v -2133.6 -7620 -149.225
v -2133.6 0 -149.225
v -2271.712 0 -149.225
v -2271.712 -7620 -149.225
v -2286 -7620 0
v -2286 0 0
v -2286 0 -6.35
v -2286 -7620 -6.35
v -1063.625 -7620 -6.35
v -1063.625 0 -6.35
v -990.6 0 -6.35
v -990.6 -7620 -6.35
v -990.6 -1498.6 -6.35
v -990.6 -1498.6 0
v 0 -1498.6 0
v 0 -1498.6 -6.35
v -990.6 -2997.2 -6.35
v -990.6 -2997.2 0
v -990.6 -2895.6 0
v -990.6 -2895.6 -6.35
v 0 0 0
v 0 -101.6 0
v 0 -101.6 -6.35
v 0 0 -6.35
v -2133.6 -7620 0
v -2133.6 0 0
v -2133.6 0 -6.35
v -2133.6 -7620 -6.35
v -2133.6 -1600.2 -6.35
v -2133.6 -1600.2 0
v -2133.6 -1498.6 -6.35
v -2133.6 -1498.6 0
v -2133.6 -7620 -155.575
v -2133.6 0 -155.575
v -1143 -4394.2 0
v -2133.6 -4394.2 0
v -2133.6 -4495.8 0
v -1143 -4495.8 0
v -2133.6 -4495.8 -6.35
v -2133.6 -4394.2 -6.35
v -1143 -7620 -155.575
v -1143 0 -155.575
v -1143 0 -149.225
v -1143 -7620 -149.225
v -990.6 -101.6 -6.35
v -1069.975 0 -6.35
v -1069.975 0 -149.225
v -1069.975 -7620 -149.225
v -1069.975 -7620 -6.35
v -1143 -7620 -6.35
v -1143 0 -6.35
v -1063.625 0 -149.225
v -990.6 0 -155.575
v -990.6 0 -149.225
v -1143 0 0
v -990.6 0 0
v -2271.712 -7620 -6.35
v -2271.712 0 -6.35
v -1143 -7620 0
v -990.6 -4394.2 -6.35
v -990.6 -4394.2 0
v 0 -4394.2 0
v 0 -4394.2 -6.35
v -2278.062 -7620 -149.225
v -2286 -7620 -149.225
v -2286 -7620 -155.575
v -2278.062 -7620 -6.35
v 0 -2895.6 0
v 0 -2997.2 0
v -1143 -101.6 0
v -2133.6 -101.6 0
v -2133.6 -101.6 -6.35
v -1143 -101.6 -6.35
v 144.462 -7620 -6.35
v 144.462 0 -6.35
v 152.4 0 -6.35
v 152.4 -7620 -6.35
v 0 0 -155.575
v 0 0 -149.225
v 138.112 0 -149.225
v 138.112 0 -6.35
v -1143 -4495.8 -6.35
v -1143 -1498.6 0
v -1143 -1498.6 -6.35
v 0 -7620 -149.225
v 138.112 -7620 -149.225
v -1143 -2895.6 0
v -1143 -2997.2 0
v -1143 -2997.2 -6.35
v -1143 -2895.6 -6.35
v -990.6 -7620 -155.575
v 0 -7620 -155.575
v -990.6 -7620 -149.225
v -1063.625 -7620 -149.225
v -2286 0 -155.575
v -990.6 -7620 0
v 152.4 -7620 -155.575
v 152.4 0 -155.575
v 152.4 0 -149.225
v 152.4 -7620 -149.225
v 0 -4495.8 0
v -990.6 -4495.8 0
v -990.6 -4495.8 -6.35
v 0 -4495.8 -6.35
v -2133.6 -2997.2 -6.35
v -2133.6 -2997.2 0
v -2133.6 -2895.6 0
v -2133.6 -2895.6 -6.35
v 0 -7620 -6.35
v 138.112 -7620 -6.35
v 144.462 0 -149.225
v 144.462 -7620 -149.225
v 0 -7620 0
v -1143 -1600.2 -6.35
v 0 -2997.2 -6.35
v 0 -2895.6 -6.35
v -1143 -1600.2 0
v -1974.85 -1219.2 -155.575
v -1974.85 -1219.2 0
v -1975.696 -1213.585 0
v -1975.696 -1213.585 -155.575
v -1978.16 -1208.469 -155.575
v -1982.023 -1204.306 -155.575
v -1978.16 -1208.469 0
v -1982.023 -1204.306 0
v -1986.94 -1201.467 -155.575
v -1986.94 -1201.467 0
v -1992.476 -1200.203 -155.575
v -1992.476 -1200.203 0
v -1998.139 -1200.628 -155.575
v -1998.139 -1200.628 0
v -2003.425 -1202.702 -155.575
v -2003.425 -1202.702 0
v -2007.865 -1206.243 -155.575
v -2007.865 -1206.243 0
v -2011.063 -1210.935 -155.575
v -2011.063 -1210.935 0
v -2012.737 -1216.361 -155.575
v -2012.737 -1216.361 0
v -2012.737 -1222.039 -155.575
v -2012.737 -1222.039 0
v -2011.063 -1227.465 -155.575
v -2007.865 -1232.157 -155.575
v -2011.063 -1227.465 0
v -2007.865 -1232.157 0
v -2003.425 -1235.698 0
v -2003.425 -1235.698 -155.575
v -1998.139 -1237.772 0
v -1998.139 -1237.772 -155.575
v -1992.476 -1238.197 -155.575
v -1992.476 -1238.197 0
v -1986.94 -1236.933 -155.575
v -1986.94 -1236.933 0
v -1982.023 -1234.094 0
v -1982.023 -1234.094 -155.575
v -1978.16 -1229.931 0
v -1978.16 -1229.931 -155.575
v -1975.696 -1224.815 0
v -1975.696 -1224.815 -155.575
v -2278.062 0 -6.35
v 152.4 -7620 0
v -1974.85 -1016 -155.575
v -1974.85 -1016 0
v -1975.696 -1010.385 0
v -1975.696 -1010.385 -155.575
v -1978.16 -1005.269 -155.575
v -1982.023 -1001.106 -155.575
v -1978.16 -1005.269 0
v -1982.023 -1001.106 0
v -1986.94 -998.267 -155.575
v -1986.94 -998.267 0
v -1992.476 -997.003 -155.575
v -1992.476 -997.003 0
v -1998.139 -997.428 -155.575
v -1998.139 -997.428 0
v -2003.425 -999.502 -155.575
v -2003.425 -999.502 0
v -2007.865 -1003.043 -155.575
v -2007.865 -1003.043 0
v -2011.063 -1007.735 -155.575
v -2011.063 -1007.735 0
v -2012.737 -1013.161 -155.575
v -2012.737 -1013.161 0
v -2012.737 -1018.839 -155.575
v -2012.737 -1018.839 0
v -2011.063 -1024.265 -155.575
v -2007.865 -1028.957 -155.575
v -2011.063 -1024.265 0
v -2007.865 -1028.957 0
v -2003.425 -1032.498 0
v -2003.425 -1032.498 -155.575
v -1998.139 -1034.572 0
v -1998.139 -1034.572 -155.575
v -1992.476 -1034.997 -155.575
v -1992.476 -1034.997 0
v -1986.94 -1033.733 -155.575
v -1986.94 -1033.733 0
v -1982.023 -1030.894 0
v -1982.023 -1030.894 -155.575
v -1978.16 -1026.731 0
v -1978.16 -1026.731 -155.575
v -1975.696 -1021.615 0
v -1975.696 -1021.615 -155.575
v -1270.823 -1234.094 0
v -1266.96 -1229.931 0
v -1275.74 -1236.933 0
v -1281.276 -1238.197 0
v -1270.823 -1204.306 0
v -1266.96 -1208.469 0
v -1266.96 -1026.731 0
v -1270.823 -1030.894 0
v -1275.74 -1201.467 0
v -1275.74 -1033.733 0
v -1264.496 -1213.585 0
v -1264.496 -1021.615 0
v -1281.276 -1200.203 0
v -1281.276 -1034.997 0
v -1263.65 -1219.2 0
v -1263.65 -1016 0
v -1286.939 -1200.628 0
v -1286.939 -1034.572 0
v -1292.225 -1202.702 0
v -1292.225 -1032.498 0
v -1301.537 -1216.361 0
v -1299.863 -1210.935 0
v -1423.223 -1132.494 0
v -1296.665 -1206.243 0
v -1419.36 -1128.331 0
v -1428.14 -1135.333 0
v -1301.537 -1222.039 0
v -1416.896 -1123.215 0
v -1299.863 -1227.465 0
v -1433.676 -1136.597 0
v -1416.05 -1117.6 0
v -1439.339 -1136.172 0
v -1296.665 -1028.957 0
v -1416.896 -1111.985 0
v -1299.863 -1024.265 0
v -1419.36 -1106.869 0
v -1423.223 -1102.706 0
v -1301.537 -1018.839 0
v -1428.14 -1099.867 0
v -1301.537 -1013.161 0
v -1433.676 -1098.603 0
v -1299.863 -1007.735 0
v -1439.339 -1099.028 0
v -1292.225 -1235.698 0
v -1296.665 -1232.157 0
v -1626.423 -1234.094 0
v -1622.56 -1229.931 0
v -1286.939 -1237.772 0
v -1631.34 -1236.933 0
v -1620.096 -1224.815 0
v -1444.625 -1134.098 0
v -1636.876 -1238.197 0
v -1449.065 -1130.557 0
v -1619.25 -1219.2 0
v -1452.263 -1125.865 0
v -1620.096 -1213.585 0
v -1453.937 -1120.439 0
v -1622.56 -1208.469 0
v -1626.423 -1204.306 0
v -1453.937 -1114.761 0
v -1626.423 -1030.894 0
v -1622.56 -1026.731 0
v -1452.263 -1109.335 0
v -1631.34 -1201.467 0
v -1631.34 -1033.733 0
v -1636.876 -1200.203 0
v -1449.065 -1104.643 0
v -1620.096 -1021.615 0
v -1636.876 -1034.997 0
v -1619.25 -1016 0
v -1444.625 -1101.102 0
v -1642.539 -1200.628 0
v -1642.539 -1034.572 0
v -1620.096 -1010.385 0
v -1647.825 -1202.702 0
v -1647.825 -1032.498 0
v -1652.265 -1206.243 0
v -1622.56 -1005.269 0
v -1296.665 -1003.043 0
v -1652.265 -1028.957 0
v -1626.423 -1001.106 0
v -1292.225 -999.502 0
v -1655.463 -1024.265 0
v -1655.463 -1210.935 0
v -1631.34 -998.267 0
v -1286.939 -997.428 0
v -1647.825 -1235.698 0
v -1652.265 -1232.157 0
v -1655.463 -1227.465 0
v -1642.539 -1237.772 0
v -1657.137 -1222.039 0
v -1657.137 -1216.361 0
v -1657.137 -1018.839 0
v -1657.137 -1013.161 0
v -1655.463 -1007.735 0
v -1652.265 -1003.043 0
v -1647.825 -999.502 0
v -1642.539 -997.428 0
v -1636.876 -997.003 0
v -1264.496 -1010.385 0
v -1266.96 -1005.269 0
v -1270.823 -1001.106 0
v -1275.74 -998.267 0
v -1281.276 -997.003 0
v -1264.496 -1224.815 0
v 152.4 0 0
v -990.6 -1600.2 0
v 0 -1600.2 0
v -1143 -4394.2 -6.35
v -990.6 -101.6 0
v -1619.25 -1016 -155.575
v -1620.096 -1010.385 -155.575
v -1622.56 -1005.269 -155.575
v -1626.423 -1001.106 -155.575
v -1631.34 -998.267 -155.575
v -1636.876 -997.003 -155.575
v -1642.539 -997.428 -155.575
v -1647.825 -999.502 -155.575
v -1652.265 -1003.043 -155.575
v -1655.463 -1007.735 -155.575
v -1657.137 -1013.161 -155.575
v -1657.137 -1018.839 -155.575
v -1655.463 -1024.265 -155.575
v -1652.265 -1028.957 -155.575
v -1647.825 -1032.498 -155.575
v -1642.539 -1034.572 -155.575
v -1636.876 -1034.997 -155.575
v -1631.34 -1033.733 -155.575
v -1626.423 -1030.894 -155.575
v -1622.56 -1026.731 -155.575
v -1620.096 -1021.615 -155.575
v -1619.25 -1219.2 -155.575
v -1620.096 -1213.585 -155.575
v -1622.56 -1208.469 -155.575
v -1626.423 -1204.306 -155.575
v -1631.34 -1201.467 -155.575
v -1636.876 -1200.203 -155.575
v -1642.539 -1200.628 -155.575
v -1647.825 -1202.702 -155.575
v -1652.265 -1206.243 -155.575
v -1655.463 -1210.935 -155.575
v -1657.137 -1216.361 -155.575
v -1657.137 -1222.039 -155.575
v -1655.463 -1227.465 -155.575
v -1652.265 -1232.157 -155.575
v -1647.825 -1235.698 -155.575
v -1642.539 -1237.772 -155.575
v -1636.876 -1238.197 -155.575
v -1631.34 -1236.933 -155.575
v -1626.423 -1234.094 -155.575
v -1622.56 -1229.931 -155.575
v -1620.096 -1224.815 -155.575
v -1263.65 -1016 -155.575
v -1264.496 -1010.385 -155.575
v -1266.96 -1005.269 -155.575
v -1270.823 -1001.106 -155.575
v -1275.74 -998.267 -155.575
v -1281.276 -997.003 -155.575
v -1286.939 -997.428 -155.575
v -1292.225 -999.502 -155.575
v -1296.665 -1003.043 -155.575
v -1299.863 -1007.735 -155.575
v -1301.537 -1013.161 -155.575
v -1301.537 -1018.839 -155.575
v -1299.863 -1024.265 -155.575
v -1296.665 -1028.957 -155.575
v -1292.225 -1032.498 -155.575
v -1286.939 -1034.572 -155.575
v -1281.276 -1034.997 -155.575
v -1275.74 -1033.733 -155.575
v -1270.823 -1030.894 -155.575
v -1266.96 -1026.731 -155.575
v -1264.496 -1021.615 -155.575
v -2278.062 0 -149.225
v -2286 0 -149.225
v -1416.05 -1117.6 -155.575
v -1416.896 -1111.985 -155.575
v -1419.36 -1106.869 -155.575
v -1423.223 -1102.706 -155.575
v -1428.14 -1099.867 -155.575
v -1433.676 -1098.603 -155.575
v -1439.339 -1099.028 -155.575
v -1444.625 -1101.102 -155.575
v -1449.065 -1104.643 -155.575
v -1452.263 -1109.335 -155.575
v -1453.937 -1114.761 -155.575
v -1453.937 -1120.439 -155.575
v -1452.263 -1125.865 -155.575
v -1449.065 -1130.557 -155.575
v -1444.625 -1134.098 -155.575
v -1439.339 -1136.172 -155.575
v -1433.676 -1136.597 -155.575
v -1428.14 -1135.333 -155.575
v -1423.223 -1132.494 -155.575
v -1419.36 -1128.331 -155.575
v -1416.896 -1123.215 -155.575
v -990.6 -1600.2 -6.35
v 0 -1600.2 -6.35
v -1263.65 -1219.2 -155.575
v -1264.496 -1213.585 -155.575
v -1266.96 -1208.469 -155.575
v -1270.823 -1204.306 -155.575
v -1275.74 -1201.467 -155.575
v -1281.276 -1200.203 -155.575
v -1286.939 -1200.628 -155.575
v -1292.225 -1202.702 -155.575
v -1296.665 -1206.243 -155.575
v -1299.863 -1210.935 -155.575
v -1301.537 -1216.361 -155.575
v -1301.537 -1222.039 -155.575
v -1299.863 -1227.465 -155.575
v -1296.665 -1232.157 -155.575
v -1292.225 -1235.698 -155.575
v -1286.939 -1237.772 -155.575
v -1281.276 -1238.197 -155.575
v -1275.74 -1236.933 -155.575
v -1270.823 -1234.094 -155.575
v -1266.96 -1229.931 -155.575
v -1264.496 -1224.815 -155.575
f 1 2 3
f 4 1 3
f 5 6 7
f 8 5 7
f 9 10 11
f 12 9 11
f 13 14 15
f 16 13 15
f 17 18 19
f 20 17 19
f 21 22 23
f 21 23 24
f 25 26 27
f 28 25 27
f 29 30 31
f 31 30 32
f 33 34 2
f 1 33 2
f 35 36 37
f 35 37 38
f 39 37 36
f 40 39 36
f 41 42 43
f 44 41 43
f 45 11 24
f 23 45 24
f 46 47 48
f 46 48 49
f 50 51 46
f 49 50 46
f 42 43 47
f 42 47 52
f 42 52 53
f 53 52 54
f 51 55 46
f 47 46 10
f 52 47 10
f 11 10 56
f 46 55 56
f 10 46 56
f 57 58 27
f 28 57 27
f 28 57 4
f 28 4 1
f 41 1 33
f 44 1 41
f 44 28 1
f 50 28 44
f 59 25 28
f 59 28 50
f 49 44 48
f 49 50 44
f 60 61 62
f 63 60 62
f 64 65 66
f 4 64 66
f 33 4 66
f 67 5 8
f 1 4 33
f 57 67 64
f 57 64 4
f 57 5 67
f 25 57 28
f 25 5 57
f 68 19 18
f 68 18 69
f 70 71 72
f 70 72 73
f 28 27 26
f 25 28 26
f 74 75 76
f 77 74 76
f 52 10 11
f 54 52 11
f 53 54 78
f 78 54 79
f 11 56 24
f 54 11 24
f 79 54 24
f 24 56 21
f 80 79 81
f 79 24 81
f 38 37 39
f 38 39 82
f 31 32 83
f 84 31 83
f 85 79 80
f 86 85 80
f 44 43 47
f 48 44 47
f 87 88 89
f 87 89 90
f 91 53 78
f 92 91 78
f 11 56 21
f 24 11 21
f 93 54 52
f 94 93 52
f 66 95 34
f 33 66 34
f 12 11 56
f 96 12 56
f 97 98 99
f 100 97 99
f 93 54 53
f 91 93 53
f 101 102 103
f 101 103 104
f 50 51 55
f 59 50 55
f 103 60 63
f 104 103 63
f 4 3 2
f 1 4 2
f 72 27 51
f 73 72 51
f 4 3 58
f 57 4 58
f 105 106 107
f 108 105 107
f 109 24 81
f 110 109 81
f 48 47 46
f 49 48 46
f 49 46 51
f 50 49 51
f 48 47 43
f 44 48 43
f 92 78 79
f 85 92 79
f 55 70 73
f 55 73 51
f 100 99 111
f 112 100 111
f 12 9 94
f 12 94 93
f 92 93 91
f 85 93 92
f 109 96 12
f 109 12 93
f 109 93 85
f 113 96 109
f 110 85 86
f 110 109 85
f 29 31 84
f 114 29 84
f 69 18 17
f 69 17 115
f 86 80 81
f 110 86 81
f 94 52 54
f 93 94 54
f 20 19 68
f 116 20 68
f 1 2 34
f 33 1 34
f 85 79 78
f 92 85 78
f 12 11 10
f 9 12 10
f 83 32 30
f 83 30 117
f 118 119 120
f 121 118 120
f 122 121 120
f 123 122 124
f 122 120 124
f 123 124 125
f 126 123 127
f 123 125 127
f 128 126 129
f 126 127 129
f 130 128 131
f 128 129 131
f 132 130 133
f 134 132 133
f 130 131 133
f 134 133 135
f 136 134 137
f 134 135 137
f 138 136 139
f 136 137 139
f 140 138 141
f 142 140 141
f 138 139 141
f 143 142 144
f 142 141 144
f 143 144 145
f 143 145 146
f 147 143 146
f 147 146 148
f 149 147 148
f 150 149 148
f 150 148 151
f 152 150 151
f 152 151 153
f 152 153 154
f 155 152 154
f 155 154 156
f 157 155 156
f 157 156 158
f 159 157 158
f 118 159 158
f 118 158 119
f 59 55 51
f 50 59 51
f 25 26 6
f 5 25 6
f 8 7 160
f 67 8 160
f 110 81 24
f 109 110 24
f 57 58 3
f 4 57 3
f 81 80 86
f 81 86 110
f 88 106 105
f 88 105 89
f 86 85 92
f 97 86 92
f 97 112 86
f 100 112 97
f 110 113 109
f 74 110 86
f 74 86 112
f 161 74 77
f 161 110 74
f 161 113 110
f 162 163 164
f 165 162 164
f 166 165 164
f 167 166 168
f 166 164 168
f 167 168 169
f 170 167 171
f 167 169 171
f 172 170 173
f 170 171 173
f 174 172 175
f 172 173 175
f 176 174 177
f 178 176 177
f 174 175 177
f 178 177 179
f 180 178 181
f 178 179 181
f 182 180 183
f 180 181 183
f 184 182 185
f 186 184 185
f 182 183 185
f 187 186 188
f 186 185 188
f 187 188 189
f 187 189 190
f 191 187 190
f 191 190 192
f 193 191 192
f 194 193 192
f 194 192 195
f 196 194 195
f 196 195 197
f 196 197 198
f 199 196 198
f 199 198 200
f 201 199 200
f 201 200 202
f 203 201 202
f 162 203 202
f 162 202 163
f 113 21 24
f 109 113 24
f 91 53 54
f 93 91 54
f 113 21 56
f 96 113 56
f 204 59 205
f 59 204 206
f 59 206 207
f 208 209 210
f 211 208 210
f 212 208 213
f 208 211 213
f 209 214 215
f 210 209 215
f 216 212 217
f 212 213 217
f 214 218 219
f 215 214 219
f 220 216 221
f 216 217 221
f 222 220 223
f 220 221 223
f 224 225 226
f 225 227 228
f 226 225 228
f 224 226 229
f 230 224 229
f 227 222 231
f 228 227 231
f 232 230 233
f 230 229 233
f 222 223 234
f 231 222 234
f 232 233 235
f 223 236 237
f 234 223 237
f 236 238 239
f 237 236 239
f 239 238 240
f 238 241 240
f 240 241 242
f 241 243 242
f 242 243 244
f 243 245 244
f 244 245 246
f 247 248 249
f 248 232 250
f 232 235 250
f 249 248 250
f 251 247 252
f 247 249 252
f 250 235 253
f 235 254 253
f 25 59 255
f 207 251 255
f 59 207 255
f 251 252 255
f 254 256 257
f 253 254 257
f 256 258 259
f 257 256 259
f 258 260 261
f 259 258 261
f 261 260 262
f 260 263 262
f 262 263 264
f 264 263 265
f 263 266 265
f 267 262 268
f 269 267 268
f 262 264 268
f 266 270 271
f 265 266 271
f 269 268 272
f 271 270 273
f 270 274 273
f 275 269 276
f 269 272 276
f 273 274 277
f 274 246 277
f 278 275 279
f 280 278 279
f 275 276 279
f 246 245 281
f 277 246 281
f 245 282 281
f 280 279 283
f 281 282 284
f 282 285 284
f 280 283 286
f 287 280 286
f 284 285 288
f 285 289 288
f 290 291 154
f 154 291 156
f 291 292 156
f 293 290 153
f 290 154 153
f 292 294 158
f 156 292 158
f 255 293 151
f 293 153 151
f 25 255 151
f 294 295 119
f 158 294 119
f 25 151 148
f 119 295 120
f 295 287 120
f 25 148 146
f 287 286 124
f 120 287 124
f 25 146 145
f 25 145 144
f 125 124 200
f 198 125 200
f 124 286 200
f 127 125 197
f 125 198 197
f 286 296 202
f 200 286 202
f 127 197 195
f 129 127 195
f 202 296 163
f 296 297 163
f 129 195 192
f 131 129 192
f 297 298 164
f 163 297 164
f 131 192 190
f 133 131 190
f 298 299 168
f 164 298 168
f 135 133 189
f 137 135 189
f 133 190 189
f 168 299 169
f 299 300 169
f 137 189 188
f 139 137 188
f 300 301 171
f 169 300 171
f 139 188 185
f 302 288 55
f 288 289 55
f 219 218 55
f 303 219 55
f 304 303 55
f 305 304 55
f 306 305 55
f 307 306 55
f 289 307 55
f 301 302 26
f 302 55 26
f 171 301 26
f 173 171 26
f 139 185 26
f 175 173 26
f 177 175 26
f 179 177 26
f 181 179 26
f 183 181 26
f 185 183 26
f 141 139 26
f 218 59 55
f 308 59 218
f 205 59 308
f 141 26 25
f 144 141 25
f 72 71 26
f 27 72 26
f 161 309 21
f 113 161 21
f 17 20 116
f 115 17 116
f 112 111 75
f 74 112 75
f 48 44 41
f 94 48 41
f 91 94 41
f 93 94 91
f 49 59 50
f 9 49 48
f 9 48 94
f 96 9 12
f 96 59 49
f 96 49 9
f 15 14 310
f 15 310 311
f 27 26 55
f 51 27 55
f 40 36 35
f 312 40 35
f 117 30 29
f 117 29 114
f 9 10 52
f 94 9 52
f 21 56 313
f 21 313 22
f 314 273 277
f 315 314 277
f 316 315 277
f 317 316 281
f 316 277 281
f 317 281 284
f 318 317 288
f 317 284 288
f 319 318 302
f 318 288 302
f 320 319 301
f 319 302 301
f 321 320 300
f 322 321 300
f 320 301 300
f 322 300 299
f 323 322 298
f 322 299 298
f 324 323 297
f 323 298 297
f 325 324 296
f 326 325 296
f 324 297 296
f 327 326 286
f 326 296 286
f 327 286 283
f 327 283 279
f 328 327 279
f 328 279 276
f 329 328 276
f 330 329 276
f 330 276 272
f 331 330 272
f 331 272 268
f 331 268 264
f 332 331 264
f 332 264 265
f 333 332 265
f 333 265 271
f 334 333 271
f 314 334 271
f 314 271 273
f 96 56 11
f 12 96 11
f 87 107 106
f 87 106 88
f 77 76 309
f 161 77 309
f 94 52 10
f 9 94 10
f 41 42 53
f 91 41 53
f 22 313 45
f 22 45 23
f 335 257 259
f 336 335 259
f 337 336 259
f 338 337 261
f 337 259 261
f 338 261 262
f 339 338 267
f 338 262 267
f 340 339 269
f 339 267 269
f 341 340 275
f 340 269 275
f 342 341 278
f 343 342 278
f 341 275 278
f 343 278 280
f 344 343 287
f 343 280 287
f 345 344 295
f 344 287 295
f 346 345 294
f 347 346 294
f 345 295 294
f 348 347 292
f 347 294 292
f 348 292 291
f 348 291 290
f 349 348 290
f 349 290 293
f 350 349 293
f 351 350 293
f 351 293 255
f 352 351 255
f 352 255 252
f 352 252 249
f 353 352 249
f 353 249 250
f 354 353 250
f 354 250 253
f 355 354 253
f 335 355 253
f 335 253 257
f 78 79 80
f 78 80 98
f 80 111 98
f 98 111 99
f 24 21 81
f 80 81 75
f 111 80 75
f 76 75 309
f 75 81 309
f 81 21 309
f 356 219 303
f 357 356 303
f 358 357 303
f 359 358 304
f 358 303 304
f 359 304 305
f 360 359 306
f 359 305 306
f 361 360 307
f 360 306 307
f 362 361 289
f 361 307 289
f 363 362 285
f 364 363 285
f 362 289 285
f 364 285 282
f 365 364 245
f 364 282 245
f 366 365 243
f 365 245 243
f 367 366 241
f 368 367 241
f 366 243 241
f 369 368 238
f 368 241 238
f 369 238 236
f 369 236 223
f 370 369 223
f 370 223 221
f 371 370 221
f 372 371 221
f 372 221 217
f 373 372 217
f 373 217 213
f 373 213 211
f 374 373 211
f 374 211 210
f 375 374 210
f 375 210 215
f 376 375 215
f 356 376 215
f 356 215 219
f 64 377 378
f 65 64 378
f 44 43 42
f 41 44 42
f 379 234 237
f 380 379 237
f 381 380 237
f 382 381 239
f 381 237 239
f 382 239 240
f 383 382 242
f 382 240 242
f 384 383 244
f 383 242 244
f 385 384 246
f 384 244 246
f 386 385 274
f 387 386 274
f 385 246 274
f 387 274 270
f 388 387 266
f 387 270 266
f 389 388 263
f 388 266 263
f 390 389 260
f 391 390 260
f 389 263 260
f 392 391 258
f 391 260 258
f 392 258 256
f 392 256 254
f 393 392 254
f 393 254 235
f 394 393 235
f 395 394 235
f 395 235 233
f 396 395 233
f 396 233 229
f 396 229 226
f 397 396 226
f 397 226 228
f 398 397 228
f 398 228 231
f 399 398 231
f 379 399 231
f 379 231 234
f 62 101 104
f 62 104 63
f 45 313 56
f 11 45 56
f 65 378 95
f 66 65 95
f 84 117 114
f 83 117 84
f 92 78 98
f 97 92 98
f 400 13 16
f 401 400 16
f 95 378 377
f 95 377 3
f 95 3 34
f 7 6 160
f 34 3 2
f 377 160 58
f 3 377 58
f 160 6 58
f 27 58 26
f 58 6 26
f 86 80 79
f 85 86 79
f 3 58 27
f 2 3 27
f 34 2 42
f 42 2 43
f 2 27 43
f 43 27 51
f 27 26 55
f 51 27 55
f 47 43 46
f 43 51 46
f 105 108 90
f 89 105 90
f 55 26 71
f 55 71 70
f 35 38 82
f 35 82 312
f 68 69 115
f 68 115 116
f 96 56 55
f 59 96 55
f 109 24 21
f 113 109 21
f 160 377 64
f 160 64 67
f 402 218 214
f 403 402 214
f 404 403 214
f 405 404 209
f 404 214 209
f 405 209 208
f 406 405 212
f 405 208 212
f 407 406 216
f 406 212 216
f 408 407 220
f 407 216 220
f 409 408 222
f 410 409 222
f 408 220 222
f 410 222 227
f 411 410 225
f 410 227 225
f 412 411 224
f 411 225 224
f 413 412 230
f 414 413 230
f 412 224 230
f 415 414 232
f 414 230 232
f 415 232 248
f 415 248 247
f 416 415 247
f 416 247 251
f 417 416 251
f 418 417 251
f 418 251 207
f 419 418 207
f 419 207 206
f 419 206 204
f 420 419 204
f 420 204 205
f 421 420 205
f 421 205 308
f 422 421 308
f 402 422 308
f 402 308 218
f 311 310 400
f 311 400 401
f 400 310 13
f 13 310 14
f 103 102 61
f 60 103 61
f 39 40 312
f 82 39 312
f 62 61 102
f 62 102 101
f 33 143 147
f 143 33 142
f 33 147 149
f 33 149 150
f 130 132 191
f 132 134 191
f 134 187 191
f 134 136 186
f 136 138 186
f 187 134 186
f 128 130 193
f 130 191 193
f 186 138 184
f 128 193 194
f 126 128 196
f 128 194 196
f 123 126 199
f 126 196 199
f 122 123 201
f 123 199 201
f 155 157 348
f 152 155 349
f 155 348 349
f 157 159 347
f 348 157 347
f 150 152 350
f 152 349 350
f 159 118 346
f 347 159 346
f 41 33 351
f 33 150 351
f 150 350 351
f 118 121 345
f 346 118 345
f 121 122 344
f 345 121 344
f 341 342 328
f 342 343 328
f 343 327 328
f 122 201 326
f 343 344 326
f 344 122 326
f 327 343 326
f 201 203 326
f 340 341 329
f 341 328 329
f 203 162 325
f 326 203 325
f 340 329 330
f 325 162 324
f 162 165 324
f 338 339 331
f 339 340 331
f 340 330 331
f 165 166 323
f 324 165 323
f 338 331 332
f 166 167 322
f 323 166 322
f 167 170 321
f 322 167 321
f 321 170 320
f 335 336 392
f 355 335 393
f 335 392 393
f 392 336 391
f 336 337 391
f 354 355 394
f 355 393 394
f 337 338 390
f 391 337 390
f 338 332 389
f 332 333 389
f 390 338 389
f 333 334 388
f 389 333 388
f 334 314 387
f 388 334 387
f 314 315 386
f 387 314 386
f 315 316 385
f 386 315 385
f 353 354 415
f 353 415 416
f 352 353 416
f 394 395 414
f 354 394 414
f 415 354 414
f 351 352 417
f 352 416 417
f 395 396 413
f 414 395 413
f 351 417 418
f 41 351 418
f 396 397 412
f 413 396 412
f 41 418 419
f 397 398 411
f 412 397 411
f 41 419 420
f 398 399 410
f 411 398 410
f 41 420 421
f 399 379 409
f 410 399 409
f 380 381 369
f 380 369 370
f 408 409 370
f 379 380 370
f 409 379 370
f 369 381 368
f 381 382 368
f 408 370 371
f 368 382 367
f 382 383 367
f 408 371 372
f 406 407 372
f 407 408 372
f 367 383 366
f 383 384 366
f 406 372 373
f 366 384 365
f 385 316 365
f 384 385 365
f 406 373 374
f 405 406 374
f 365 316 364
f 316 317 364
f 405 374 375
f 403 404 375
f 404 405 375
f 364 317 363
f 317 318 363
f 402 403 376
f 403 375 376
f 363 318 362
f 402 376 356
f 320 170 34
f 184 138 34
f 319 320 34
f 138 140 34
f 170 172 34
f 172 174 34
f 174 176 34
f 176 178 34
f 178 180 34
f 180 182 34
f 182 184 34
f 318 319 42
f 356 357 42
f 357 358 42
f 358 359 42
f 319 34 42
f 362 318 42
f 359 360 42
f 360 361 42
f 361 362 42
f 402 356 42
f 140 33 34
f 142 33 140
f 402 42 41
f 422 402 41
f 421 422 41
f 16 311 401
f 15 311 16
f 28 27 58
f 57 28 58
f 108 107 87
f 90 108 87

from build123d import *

# Parameters (mm, degrees)
F0_W      = 6.35
F0_H      = 142.875
F1_DEPTH  = 7620
F2_W      = 6.35
F2_H      = 142.875
F3_DEPTH  = 7620
F4_W      = 6.35
F4_H      = 142.875
F5_DEPTH  = 7620
F7_DEPTH  = 7620
F8_W      = 990.6
F8_H      = 101.6
F9_DEPTH  = 6.35
F10_R     = 19.05
F11_DEPTH = 155.576


with BuildPart() as f1:
    # F0 (on Front) → F1 (new body)
    with BuildSketch(Plane.XZ):
        Polygon((152.4, 0), (0, 0), (0, -6.35), (138.1125, -6.35), (144.4625, -6.35), (152.4, -6.35), align=None)
        with Locations((141.2875, -77.7875)):
            Rectangle(F0_W, F0_H)
        Polygon((144.4625, -149.225), (138.1125, -149.225), (0, -149.225), (0, -155.575), (152.4, -155.575), (152.4, -149.225), align=None)
    extrude(amount=F1_DEPTH)


with BuildPart() as f3:
    # F2 (on Front) → F3 (new body)
    with BuildSketch(Plane.XZ):
        Polygon((-2133.6, 0), (-2286, 0), (-2286, -6.35), (-2278.0625, -6.35), (-2271.7125, -6.35), (-2133.6, -6.35), align=None)
        with Locations((-2274.8875, -77.7875)):
            Rectangle(F2_W, F2_H)
        Polygon((-2271.7125, -149.225), (-2278.0625, -149.225), (-2286, -149.225), (-2286, -155.575), (-2133.6, -155.575), (-2133.6, -149.225), align=None)
    extrude(amount=F3_DEPTH)


with BuildPart() as f5:
    # F4 (on Front) → F5 (new body)
    with BuildSketch(Plane.XZ):
        Polygon((-990.6, 0), (-1143, 0), (-1143, -6.35), (-1069.975, -6.35), (-1063.625, -6.35), (-990.6, -6.35), align=None)
        with Locations((-1066.8, -77.7875)):
            Rectangle(F4_W, F4_H)
        Polygon((-1063.625, -149.225), (-1069.975, -149.225), (-1143, -149.225), (-1143, -155.575), (-990.6, -155.575), (-990.6, -149.225), align=None)
    extrude(amount=F5_DEPTH)


with BuildPart() as f7:
    # F6 (on Front) → F7 (new body)
    with BuildSketch(Plane.XZ):
        Polygon((0, -6.35), (0, 0), (-990.6, 0), (-990.6, -6.35), (-1063.625, -6.35), (-1063.625, -149.225), (-990.6, -149.225), (-990.6, -155.575), (0, -155.575), (0, -149.225), (138.1125, -149.225), (138.1125, -6.35), align=None)
        Polygon((-1143, -6.35), (-1143, 0), (-2133.6, 0), (-2133.6, -6.35), (-2271.7125, -6.35), (-2271.7125, -149.225), (-2133.6, -149.225), (-2133.6, -155.575), (-1143, -155.575), (-1143, -149.225), (-1069.975, -149.225), (-1069.975, -6.35), align=None)
    extrude(amount=F7_DEPTH)

    # F10 (on face) → F11 (cut, through all)
    with BuildSketch(Plane.XY):
        with Locations((-1993.9, -1016)):
            Circle(F10_R)
        with Locations((-1993.9, -1219.2)):
            Circle(F10_R)
        with Locations((-1638.3, -1016)):
            Circle(F10_R)
        with Locations((-1638.3, -1219.2)):
            Circle(F10_R)
        with Locations((-1282.7, -1016)):
            Circle(F10_R)
        with Locations((-1282.7, -1219.2)):
            Circle(F10_R)
        with Locations((-1435.1, -1117.6)):
            Circle(F10_R)
    extrude(amount=-F11_DEPTH, mode=Mode.SUBTRACT)


with BuildPart() as f9:
    # F8 (on face) → F9 (new body)
    with BuildSketch(Plane.XY):
        with Locations((-495.3, -1549.4)):
            Rectangle(F8_W, F8_H)
        with Locations((-1638.3, -1549.4)):
            Rectangle(F8_W, F8_H)
        with Locations((-1638.3, -50.8)):
            Rectangle(F8_W, F8_H)
        with Locations((-495.3, -50.8)):
            Rectangle(F8_W, F8_H)
        with Locations((-495.3, -2946.4)):
            Rectangle(F8_W, F8_H)
        with Locations((-1638.3, -2946.4)):
            Rectangle(F8_W, F8_H)
        with Locations((-495.3, -4445)):
            Rectangle(F8_W, F8_H)
        with Locations((-1638.3, -4445)):
            Rectangle(F8_W, F8_H)
    extrude(amount=-F9_DEPTH)


solid = Compound([f1.part, f3.part, f5.part, f7.part, f9.part])
